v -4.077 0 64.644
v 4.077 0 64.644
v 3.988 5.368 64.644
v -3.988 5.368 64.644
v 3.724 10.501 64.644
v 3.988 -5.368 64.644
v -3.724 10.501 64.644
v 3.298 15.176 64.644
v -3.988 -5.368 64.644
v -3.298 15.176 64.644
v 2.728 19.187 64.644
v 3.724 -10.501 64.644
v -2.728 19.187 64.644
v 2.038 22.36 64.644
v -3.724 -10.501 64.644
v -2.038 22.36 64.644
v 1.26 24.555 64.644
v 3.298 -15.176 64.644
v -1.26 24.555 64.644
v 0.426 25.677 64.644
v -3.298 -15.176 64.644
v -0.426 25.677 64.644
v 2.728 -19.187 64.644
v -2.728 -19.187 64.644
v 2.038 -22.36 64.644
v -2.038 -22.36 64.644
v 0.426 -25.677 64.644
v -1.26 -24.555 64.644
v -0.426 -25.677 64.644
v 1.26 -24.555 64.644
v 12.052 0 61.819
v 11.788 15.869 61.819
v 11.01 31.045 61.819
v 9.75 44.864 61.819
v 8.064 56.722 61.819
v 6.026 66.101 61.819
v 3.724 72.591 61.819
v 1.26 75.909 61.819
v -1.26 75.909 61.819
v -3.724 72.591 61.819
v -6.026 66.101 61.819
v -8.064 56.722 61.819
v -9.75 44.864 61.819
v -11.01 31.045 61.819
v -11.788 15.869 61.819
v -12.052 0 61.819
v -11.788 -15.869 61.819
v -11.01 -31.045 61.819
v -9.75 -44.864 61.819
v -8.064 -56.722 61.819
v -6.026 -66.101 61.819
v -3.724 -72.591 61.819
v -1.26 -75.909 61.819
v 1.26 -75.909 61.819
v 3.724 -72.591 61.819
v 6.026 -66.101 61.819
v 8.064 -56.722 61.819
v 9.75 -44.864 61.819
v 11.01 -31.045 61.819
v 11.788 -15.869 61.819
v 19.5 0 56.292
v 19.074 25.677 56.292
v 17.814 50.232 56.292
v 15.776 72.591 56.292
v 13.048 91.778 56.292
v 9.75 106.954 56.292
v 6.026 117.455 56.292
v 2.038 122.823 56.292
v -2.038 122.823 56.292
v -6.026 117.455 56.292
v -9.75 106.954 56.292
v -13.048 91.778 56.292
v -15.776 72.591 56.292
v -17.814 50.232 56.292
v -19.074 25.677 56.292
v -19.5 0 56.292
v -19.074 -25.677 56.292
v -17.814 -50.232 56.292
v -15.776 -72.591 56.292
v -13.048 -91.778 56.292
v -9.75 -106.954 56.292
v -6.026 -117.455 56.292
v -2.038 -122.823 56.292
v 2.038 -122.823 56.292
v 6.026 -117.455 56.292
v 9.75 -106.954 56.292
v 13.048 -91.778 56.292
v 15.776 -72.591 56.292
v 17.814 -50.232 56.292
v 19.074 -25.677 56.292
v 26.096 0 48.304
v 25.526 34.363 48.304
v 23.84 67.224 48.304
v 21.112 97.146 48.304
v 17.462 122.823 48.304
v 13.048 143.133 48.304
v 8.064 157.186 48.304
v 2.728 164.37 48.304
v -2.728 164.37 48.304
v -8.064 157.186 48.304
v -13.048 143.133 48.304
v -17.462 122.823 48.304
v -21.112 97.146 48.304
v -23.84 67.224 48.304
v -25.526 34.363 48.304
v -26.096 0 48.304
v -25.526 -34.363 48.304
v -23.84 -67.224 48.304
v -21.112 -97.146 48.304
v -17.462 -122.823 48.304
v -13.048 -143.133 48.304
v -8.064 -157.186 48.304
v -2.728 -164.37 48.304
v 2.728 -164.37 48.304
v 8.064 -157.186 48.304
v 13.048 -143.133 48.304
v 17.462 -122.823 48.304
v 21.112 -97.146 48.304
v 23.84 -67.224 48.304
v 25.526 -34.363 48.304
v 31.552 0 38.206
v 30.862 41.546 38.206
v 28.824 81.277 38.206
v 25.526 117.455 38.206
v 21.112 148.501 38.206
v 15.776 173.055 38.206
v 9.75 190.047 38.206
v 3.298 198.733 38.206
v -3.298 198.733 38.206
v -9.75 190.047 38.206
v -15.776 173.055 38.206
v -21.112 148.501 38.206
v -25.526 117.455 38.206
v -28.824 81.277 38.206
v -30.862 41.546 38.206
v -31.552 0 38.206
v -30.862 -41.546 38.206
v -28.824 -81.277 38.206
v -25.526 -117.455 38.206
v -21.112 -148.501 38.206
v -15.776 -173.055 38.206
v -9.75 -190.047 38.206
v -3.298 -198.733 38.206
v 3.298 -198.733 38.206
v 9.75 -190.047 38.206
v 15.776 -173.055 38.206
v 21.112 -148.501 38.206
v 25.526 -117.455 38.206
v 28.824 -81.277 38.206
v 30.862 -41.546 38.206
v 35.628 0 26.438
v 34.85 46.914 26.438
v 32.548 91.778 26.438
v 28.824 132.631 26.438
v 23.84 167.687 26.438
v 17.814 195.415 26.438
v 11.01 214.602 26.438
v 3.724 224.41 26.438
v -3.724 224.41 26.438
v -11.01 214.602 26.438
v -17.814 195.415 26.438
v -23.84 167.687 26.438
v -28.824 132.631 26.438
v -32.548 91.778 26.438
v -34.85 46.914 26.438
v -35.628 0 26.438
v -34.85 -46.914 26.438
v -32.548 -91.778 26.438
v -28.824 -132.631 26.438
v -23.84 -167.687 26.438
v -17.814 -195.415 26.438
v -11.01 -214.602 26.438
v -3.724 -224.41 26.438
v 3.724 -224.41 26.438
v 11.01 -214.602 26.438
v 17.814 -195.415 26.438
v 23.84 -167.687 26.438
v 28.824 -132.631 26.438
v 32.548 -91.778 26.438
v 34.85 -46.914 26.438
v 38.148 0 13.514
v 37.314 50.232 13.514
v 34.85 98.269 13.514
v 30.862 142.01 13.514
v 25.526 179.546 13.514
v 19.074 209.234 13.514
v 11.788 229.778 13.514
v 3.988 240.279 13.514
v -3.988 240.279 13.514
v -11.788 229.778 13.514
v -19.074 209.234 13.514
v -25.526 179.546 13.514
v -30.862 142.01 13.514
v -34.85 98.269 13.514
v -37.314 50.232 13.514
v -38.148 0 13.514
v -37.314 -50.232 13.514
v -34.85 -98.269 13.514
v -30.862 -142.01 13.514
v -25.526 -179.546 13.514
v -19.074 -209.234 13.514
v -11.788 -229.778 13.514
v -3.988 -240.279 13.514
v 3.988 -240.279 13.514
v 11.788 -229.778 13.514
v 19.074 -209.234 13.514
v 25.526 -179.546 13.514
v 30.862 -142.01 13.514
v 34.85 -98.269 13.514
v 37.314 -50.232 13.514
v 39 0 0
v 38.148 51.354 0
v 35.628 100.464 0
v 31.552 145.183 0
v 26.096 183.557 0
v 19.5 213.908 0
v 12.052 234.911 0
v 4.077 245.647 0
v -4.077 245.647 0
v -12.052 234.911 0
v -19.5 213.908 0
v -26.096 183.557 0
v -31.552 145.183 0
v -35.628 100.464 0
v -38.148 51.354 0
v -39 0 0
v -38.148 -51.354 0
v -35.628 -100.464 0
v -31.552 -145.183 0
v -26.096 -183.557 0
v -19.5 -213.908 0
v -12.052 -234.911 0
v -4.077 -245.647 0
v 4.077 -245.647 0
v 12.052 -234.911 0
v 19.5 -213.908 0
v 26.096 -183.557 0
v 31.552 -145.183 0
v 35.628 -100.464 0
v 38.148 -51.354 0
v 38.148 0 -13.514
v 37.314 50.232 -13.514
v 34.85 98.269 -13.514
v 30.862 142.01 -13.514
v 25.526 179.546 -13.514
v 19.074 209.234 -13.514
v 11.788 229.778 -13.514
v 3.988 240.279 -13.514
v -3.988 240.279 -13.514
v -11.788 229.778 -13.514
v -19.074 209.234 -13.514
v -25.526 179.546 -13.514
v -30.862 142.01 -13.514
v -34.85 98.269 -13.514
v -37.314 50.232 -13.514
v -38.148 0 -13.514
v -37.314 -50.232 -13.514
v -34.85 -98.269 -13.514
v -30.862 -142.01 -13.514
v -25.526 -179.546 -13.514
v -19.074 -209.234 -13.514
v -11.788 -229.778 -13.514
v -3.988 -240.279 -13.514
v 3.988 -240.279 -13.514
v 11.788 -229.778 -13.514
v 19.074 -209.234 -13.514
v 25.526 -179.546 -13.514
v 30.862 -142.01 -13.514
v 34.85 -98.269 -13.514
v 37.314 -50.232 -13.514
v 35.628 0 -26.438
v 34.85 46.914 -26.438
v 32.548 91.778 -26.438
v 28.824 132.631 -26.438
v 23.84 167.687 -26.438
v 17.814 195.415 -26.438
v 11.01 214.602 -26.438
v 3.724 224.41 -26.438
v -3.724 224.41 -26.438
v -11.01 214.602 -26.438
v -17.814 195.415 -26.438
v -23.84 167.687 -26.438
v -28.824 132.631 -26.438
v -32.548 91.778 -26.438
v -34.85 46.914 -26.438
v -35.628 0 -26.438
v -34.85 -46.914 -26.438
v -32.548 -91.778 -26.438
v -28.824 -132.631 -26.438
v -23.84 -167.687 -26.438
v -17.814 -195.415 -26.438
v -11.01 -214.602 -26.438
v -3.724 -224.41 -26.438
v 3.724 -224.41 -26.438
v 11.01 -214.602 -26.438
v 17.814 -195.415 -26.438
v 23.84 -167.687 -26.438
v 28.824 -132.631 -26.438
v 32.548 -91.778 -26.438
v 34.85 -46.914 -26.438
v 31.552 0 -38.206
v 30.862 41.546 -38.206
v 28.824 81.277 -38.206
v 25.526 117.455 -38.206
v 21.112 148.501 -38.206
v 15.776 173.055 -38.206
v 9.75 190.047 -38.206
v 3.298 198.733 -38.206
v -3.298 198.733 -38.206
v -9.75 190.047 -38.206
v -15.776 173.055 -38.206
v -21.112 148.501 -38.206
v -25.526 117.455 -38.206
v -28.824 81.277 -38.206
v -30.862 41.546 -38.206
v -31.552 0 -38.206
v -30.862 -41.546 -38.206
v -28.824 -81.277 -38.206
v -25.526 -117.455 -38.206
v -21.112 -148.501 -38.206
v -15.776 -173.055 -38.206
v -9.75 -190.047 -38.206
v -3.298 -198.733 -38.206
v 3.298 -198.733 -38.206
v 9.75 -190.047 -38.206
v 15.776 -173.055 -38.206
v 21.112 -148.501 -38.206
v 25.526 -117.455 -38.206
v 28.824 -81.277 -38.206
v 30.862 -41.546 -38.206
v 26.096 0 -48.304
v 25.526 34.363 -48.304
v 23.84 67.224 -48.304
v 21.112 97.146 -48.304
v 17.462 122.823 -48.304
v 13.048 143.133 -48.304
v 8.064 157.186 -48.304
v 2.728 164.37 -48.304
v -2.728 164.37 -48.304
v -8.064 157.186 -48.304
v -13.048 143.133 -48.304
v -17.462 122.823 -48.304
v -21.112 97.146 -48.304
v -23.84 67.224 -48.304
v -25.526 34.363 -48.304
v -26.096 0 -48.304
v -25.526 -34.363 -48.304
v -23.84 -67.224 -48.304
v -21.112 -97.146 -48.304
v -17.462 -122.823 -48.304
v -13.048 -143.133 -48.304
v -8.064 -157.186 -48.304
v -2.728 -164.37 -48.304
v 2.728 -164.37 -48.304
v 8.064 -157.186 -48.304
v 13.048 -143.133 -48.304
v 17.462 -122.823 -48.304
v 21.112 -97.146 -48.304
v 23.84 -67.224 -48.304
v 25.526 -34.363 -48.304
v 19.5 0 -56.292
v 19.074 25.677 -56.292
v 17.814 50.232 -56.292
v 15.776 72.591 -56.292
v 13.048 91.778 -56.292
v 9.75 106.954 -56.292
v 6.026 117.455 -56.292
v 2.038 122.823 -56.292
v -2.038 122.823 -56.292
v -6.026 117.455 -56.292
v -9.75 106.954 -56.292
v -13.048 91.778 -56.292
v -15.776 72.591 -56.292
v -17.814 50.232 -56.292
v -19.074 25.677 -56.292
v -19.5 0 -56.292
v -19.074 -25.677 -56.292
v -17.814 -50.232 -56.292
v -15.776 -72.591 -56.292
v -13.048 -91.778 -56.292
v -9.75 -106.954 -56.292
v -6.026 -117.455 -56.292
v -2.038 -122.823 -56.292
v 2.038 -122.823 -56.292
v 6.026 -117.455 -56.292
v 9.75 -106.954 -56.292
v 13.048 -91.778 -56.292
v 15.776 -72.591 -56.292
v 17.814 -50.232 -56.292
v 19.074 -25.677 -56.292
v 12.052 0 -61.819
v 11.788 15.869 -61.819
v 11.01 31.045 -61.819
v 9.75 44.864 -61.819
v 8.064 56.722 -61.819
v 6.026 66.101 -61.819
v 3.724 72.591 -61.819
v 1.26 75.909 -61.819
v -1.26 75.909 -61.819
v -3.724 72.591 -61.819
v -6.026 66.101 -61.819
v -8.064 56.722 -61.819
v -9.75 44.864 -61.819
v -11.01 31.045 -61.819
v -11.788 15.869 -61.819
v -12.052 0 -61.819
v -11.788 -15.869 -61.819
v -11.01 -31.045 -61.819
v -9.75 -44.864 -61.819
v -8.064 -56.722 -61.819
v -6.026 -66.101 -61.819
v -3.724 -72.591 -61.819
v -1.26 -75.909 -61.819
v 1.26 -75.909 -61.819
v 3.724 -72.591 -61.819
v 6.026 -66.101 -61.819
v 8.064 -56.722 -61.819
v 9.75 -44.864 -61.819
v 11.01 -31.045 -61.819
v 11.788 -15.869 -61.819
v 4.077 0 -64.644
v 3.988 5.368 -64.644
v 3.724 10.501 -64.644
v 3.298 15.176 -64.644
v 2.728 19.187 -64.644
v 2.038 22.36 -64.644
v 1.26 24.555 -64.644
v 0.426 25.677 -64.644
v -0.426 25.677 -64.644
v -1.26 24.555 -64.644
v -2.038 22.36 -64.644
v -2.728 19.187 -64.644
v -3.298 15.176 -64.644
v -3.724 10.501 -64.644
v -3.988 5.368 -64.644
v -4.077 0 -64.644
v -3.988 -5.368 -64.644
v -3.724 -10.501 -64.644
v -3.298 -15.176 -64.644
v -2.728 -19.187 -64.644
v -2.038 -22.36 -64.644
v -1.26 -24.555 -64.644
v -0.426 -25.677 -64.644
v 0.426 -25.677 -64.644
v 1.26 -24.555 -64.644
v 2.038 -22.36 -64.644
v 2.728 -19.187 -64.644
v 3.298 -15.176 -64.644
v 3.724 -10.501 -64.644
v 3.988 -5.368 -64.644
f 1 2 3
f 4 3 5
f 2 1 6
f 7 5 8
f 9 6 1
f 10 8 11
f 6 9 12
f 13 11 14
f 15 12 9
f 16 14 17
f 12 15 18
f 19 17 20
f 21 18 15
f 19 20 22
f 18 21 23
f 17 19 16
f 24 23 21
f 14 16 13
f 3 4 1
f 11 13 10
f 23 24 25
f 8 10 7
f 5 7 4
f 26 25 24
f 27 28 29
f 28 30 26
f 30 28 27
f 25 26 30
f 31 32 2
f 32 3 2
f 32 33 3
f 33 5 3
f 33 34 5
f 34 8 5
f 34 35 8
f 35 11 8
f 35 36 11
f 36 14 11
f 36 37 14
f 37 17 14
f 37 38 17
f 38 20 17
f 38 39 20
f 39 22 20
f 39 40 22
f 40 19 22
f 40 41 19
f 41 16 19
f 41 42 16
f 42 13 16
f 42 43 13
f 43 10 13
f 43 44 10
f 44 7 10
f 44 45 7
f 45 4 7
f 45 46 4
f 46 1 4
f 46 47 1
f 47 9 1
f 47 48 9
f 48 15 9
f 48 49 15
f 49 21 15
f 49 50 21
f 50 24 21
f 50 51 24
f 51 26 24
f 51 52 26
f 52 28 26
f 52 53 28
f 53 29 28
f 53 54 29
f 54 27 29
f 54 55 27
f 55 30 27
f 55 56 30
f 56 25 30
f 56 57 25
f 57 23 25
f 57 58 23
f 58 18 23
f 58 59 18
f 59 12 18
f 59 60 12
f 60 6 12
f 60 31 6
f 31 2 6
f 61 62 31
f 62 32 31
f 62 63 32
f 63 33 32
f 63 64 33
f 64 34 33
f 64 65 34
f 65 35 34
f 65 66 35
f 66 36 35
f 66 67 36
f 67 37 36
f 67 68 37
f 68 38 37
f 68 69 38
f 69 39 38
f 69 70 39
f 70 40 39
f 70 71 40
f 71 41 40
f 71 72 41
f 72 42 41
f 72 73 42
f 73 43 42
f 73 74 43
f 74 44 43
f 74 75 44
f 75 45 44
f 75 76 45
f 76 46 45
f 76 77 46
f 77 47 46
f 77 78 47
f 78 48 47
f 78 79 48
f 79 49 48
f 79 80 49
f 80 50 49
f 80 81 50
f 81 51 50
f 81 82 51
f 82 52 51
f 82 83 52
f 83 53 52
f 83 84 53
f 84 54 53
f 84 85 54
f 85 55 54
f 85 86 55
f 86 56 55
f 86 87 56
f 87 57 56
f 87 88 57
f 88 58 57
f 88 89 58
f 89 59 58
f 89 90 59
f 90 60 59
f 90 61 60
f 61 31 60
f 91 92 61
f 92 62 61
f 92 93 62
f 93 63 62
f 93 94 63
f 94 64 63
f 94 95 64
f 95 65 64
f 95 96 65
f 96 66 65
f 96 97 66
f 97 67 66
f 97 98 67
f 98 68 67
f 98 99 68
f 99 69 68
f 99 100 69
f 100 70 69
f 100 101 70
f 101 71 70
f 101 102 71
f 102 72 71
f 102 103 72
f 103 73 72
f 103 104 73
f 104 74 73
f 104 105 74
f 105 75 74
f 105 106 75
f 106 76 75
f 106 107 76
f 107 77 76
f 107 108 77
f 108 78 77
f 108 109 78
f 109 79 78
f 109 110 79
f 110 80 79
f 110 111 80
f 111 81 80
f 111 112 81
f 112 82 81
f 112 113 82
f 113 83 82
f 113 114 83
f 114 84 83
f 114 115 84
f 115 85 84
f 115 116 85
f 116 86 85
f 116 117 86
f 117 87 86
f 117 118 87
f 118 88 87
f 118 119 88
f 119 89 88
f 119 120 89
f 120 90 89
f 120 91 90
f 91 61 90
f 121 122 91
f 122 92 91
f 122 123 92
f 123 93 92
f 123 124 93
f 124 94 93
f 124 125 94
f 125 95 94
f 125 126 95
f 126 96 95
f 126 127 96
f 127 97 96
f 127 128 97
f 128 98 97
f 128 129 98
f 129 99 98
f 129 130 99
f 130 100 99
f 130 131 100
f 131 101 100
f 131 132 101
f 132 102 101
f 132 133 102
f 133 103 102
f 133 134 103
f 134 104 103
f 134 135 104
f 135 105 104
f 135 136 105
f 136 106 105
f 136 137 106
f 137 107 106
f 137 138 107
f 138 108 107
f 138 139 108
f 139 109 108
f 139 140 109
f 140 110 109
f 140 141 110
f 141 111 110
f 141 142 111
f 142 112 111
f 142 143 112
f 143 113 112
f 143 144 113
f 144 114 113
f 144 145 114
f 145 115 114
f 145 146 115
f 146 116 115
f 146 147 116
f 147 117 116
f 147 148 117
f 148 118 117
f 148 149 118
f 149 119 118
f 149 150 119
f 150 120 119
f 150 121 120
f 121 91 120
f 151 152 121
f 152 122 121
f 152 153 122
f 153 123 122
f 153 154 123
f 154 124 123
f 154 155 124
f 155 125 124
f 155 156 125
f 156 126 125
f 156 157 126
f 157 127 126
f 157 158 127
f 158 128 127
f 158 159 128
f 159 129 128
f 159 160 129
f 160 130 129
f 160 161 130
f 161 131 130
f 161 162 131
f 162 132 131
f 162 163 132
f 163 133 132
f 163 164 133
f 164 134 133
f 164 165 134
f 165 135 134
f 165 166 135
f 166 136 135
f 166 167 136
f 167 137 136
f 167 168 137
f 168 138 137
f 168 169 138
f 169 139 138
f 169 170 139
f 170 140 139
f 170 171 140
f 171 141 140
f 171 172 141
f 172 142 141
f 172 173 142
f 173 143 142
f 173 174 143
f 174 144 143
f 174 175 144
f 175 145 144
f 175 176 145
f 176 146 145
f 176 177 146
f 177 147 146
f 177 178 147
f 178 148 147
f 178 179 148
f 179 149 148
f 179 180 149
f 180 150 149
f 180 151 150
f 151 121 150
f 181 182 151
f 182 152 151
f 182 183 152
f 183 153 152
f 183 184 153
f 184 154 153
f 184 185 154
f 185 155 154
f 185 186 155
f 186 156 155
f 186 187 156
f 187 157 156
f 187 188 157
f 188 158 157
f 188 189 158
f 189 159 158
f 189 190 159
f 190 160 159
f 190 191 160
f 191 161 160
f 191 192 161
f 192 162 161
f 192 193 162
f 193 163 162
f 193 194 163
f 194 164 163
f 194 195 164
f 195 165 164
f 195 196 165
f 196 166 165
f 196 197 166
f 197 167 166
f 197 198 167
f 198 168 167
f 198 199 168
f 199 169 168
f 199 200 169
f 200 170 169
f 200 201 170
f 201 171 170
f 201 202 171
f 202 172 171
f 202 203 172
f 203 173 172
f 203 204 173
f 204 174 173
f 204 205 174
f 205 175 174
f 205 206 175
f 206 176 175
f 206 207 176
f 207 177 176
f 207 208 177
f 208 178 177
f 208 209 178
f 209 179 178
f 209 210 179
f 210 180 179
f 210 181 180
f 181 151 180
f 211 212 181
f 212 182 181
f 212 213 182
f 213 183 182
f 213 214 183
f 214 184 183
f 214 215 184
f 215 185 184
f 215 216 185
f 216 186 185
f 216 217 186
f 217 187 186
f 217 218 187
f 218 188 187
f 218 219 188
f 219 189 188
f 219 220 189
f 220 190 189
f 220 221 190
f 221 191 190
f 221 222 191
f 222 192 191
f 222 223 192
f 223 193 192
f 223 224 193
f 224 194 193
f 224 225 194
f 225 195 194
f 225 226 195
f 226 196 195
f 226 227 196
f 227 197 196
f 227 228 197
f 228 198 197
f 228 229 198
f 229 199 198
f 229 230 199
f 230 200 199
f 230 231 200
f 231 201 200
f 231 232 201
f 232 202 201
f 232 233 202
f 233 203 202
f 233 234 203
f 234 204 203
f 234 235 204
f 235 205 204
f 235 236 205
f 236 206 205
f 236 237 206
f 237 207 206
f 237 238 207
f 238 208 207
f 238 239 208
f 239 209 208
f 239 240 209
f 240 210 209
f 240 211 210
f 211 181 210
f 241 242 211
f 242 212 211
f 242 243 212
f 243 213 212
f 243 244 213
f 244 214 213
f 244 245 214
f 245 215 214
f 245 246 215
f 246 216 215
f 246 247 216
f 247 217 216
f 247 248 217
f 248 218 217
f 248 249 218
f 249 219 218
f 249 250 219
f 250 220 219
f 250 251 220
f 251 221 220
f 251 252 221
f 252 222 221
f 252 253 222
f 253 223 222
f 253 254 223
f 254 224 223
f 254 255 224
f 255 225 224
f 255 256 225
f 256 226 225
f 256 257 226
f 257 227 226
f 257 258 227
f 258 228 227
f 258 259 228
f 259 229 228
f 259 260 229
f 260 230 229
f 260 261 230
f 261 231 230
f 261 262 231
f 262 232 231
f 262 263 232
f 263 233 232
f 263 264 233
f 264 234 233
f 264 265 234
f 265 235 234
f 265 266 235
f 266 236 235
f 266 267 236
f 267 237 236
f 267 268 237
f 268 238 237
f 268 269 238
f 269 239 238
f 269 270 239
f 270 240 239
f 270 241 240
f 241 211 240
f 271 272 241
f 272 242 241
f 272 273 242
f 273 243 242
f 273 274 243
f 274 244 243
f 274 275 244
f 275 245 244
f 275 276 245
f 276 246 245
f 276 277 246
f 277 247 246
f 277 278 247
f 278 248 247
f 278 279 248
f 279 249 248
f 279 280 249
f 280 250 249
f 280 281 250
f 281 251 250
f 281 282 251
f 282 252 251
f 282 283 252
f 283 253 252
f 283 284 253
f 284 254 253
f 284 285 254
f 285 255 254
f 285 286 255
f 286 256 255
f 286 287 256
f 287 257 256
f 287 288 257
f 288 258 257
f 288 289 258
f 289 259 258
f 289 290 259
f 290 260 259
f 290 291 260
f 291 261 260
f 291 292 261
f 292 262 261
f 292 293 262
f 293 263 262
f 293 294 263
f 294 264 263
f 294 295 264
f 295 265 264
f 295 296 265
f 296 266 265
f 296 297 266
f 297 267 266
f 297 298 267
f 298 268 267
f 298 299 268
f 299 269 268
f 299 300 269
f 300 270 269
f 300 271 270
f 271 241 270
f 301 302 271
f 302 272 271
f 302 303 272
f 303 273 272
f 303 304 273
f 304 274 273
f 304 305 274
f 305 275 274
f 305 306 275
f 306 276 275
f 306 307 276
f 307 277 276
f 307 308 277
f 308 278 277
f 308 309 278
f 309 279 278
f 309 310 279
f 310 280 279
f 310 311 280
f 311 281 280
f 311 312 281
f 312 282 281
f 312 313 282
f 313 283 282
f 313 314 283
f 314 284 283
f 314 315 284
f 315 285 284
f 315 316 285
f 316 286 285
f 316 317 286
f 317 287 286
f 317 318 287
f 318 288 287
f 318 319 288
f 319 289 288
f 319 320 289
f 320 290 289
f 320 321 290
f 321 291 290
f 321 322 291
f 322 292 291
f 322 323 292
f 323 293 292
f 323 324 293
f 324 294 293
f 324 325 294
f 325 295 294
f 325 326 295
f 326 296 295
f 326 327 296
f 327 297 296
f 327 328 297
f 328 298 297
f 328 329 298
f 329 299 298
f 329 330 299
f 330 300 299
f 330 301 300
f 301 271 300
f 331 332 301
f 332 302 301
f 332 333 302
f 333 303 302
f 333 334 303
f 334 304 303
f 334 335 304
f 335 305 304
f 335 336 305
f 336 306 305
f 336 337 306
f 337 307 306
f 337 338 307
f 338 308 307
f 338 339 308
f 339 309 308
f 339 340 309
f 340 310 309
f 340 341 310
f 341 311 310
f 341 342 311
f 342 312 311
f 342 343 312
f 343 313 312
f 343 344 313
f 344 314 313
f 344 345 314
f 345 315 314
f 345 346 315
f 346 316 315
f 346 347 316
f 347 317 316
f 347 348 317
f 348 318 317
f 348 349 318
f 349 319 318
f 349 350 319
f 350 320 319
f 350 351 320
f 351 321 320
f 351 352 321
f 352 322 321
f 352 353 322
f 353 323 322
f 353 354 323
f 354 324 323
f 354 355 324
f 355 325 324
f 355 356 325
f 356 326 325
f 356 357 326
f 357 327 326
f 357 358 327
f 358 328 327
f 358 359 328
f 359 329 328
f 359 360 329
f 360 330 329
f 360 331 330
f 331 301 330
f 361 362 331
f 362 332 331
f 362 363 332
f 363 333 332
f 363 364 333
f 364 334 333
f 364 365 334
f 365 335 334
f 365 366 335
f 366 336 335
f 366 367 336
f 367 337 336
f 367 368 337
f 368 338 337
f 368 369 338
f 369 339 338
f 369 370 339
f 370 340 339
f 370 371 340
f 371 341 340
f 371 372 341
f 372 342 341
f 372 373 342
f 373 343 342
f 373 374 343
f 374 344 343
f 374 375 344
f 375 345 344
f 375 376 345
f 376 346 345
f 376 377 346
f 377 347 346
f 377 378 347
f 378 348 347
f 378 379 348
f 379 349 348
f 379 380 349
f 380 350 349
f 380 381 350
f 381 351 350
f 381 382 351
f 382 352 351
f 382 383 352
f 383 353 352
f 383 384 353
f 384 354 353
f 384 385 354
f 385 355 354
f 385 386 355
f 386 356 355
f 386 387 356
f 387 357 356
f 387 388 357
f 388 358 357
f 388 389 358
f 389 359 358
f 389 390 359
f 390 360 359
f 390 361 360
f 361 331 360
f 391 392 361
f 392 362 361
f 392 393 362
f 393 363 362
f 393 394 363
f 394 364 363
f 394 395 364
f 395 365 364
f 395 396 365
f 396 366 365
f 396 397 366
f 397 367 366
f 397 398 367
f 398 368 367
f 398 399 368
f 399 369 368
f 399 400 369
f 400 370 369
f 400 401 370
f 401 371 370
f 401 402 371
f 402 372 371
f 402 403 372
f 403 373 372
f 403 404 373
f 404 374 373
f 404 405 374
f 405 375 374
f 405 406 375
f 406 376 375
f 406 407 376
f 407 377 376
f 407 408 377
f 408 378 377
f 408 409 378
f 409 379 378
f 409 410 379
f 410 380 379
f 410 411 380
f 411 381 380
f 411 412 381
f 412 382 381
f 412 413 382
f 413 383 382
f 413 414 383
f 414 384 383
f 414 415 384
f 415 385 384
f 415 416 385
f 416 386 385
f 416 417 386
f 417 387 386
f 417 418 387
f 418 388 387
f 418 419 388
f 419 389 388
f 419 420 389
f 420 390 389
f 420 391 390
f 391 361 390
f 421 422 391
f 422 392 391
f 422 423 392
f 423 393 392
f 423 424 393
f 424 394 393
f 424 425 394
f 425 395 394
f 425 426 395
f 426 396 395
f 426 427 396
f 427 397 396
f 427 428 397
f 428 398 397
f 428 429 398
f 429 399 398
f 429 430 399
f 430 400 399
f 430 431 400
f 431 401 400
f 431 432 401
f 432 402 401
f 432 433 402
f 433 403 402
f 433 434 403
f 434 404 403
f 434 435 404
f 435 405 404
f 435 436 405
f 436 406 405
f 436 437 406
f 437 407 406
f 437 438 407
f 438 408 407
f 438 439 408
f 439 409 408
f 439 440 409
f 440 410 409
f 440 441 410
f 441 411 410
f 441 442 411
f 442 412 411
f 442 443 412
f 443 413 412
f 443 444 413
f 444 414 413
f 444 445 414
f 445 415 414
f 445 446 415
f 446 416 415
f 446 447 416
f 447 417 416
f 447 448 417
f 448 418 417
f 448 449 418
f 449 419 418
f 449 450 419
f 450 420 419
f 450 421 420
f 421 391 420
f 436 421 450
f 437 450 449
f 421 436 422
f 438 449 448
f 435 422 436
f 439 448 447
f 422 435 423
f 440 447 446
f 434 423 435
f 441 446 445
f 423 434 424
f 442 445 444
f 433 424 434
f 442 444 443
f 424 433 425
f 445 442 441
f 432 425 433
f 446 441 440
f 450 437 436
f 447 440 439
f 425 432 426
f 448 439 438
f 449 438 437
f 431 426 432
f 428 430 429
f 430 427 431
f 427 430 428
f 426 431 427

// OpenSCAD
// Generated by SolidPython 1.0.1 on 2020-07-29 00:46:46


scale(v = [3, 19, 5]) {
	sphere(r = 13);
}
/***********************************************
*********      SolidPython code:      **********
************************************************
 
# import packages: SolidPython
from solid import *
from solid.utils import *
from itertools import chain, combinations, permutations


class Resize:

    def __init__(self, scad_file):
        self.scad_file = scad_file
        #self.scad_file = import_scad(scad_file)
        # cone/cylinder param:
        self.r1 = 0
        self.r2 = 0
        self.h = 0
        # rectangular prism param:
        self.w = 0
        self.l = 0
        # ellipse param:
        self.r = 0

    # import OpenScad code (file name corresponds to shape)


    # classify shape + parameters
    def assign(self, param1, param2, param3):
        if self.scad_file == 'cone.scad':
            self.r1 = param1
            self.r2 = param2
            self.h = param3
        elif self.scad_file == 'cylinder.scad':
            self.r1 = param1
            self.r2 = param2
            self.h = param3
        elif self.scad_file == 'rectangularPrism.scad':
            self.h = param1
            self.l = param2
            self.w = param3
        else:
            self.r = param1
            self.h = param2

    # resize parameters
    def iterate(self):
        x = range(3, 20, 2)
        i = 1
        if self.scad_file == 'cone.scad':
            tempList = list(permutations(x, 2))
            for temp in tempList:
                param1 = temp[0]
                param2 = temp[1]
                filepath = 'produced_scad_files/' + 'cone' + str(param1) + '_' + str(param2) + '_' + '.scad'
                scad_render_to_file(cylinder(h=param1, r1=param2, r2=0), filepath)

        elif self.scad_file == 'cylinder.scad':
            tempList = list(permutations(x, 3))
            for temp in tempList:
                param1 = temp[0]
                param2 = temp[1]
                filepath = 'produced_scad_files/' + 'cylinder' + str(param1) + '_' + str(param2) + '_' + '.scad'
                scad_render_to_file(cylinder(h=param1, r1=param2, r2=param2), filepath)

        elif self.scad_file == 'rectangularPrism.scad':
            tempList = list(permutations(x, 3))
            for temp in tempList:
                param1 = temp[0]
                param2 = temp[1]
                param3 = temp[2]
                filepath = 'produced_scad_files/' + 'rectangularPrism' + str(param1) + '_' + str(param2) + '_' + str(
                    param3) + '.scad'
                scad_render_to_file(cube(size=(param1, param2, param3)), filepath)

        elif self.scad_file == 'ellipse.scad':
            tempList = list(permutations(x, 4))
            for temp in tempList:
                param1 = temp[0]
                param2 = temp[1]
                param3 = temp[2]
                param4 = temp[3]
                filepath = 'produced_scad_files/' + 'ellipse' + str(param1) + '_' + str(param2) + '_' + str(param3) + '_' + str(param4) + '.scad'
                scad_render_to_file(scale([param1, param2, param3])(sphere(r=param4)), filepath)

    def render_to_scadfile(self):
        scad_render_to_file(scad, 'example.scad') 
 
************************************************/
